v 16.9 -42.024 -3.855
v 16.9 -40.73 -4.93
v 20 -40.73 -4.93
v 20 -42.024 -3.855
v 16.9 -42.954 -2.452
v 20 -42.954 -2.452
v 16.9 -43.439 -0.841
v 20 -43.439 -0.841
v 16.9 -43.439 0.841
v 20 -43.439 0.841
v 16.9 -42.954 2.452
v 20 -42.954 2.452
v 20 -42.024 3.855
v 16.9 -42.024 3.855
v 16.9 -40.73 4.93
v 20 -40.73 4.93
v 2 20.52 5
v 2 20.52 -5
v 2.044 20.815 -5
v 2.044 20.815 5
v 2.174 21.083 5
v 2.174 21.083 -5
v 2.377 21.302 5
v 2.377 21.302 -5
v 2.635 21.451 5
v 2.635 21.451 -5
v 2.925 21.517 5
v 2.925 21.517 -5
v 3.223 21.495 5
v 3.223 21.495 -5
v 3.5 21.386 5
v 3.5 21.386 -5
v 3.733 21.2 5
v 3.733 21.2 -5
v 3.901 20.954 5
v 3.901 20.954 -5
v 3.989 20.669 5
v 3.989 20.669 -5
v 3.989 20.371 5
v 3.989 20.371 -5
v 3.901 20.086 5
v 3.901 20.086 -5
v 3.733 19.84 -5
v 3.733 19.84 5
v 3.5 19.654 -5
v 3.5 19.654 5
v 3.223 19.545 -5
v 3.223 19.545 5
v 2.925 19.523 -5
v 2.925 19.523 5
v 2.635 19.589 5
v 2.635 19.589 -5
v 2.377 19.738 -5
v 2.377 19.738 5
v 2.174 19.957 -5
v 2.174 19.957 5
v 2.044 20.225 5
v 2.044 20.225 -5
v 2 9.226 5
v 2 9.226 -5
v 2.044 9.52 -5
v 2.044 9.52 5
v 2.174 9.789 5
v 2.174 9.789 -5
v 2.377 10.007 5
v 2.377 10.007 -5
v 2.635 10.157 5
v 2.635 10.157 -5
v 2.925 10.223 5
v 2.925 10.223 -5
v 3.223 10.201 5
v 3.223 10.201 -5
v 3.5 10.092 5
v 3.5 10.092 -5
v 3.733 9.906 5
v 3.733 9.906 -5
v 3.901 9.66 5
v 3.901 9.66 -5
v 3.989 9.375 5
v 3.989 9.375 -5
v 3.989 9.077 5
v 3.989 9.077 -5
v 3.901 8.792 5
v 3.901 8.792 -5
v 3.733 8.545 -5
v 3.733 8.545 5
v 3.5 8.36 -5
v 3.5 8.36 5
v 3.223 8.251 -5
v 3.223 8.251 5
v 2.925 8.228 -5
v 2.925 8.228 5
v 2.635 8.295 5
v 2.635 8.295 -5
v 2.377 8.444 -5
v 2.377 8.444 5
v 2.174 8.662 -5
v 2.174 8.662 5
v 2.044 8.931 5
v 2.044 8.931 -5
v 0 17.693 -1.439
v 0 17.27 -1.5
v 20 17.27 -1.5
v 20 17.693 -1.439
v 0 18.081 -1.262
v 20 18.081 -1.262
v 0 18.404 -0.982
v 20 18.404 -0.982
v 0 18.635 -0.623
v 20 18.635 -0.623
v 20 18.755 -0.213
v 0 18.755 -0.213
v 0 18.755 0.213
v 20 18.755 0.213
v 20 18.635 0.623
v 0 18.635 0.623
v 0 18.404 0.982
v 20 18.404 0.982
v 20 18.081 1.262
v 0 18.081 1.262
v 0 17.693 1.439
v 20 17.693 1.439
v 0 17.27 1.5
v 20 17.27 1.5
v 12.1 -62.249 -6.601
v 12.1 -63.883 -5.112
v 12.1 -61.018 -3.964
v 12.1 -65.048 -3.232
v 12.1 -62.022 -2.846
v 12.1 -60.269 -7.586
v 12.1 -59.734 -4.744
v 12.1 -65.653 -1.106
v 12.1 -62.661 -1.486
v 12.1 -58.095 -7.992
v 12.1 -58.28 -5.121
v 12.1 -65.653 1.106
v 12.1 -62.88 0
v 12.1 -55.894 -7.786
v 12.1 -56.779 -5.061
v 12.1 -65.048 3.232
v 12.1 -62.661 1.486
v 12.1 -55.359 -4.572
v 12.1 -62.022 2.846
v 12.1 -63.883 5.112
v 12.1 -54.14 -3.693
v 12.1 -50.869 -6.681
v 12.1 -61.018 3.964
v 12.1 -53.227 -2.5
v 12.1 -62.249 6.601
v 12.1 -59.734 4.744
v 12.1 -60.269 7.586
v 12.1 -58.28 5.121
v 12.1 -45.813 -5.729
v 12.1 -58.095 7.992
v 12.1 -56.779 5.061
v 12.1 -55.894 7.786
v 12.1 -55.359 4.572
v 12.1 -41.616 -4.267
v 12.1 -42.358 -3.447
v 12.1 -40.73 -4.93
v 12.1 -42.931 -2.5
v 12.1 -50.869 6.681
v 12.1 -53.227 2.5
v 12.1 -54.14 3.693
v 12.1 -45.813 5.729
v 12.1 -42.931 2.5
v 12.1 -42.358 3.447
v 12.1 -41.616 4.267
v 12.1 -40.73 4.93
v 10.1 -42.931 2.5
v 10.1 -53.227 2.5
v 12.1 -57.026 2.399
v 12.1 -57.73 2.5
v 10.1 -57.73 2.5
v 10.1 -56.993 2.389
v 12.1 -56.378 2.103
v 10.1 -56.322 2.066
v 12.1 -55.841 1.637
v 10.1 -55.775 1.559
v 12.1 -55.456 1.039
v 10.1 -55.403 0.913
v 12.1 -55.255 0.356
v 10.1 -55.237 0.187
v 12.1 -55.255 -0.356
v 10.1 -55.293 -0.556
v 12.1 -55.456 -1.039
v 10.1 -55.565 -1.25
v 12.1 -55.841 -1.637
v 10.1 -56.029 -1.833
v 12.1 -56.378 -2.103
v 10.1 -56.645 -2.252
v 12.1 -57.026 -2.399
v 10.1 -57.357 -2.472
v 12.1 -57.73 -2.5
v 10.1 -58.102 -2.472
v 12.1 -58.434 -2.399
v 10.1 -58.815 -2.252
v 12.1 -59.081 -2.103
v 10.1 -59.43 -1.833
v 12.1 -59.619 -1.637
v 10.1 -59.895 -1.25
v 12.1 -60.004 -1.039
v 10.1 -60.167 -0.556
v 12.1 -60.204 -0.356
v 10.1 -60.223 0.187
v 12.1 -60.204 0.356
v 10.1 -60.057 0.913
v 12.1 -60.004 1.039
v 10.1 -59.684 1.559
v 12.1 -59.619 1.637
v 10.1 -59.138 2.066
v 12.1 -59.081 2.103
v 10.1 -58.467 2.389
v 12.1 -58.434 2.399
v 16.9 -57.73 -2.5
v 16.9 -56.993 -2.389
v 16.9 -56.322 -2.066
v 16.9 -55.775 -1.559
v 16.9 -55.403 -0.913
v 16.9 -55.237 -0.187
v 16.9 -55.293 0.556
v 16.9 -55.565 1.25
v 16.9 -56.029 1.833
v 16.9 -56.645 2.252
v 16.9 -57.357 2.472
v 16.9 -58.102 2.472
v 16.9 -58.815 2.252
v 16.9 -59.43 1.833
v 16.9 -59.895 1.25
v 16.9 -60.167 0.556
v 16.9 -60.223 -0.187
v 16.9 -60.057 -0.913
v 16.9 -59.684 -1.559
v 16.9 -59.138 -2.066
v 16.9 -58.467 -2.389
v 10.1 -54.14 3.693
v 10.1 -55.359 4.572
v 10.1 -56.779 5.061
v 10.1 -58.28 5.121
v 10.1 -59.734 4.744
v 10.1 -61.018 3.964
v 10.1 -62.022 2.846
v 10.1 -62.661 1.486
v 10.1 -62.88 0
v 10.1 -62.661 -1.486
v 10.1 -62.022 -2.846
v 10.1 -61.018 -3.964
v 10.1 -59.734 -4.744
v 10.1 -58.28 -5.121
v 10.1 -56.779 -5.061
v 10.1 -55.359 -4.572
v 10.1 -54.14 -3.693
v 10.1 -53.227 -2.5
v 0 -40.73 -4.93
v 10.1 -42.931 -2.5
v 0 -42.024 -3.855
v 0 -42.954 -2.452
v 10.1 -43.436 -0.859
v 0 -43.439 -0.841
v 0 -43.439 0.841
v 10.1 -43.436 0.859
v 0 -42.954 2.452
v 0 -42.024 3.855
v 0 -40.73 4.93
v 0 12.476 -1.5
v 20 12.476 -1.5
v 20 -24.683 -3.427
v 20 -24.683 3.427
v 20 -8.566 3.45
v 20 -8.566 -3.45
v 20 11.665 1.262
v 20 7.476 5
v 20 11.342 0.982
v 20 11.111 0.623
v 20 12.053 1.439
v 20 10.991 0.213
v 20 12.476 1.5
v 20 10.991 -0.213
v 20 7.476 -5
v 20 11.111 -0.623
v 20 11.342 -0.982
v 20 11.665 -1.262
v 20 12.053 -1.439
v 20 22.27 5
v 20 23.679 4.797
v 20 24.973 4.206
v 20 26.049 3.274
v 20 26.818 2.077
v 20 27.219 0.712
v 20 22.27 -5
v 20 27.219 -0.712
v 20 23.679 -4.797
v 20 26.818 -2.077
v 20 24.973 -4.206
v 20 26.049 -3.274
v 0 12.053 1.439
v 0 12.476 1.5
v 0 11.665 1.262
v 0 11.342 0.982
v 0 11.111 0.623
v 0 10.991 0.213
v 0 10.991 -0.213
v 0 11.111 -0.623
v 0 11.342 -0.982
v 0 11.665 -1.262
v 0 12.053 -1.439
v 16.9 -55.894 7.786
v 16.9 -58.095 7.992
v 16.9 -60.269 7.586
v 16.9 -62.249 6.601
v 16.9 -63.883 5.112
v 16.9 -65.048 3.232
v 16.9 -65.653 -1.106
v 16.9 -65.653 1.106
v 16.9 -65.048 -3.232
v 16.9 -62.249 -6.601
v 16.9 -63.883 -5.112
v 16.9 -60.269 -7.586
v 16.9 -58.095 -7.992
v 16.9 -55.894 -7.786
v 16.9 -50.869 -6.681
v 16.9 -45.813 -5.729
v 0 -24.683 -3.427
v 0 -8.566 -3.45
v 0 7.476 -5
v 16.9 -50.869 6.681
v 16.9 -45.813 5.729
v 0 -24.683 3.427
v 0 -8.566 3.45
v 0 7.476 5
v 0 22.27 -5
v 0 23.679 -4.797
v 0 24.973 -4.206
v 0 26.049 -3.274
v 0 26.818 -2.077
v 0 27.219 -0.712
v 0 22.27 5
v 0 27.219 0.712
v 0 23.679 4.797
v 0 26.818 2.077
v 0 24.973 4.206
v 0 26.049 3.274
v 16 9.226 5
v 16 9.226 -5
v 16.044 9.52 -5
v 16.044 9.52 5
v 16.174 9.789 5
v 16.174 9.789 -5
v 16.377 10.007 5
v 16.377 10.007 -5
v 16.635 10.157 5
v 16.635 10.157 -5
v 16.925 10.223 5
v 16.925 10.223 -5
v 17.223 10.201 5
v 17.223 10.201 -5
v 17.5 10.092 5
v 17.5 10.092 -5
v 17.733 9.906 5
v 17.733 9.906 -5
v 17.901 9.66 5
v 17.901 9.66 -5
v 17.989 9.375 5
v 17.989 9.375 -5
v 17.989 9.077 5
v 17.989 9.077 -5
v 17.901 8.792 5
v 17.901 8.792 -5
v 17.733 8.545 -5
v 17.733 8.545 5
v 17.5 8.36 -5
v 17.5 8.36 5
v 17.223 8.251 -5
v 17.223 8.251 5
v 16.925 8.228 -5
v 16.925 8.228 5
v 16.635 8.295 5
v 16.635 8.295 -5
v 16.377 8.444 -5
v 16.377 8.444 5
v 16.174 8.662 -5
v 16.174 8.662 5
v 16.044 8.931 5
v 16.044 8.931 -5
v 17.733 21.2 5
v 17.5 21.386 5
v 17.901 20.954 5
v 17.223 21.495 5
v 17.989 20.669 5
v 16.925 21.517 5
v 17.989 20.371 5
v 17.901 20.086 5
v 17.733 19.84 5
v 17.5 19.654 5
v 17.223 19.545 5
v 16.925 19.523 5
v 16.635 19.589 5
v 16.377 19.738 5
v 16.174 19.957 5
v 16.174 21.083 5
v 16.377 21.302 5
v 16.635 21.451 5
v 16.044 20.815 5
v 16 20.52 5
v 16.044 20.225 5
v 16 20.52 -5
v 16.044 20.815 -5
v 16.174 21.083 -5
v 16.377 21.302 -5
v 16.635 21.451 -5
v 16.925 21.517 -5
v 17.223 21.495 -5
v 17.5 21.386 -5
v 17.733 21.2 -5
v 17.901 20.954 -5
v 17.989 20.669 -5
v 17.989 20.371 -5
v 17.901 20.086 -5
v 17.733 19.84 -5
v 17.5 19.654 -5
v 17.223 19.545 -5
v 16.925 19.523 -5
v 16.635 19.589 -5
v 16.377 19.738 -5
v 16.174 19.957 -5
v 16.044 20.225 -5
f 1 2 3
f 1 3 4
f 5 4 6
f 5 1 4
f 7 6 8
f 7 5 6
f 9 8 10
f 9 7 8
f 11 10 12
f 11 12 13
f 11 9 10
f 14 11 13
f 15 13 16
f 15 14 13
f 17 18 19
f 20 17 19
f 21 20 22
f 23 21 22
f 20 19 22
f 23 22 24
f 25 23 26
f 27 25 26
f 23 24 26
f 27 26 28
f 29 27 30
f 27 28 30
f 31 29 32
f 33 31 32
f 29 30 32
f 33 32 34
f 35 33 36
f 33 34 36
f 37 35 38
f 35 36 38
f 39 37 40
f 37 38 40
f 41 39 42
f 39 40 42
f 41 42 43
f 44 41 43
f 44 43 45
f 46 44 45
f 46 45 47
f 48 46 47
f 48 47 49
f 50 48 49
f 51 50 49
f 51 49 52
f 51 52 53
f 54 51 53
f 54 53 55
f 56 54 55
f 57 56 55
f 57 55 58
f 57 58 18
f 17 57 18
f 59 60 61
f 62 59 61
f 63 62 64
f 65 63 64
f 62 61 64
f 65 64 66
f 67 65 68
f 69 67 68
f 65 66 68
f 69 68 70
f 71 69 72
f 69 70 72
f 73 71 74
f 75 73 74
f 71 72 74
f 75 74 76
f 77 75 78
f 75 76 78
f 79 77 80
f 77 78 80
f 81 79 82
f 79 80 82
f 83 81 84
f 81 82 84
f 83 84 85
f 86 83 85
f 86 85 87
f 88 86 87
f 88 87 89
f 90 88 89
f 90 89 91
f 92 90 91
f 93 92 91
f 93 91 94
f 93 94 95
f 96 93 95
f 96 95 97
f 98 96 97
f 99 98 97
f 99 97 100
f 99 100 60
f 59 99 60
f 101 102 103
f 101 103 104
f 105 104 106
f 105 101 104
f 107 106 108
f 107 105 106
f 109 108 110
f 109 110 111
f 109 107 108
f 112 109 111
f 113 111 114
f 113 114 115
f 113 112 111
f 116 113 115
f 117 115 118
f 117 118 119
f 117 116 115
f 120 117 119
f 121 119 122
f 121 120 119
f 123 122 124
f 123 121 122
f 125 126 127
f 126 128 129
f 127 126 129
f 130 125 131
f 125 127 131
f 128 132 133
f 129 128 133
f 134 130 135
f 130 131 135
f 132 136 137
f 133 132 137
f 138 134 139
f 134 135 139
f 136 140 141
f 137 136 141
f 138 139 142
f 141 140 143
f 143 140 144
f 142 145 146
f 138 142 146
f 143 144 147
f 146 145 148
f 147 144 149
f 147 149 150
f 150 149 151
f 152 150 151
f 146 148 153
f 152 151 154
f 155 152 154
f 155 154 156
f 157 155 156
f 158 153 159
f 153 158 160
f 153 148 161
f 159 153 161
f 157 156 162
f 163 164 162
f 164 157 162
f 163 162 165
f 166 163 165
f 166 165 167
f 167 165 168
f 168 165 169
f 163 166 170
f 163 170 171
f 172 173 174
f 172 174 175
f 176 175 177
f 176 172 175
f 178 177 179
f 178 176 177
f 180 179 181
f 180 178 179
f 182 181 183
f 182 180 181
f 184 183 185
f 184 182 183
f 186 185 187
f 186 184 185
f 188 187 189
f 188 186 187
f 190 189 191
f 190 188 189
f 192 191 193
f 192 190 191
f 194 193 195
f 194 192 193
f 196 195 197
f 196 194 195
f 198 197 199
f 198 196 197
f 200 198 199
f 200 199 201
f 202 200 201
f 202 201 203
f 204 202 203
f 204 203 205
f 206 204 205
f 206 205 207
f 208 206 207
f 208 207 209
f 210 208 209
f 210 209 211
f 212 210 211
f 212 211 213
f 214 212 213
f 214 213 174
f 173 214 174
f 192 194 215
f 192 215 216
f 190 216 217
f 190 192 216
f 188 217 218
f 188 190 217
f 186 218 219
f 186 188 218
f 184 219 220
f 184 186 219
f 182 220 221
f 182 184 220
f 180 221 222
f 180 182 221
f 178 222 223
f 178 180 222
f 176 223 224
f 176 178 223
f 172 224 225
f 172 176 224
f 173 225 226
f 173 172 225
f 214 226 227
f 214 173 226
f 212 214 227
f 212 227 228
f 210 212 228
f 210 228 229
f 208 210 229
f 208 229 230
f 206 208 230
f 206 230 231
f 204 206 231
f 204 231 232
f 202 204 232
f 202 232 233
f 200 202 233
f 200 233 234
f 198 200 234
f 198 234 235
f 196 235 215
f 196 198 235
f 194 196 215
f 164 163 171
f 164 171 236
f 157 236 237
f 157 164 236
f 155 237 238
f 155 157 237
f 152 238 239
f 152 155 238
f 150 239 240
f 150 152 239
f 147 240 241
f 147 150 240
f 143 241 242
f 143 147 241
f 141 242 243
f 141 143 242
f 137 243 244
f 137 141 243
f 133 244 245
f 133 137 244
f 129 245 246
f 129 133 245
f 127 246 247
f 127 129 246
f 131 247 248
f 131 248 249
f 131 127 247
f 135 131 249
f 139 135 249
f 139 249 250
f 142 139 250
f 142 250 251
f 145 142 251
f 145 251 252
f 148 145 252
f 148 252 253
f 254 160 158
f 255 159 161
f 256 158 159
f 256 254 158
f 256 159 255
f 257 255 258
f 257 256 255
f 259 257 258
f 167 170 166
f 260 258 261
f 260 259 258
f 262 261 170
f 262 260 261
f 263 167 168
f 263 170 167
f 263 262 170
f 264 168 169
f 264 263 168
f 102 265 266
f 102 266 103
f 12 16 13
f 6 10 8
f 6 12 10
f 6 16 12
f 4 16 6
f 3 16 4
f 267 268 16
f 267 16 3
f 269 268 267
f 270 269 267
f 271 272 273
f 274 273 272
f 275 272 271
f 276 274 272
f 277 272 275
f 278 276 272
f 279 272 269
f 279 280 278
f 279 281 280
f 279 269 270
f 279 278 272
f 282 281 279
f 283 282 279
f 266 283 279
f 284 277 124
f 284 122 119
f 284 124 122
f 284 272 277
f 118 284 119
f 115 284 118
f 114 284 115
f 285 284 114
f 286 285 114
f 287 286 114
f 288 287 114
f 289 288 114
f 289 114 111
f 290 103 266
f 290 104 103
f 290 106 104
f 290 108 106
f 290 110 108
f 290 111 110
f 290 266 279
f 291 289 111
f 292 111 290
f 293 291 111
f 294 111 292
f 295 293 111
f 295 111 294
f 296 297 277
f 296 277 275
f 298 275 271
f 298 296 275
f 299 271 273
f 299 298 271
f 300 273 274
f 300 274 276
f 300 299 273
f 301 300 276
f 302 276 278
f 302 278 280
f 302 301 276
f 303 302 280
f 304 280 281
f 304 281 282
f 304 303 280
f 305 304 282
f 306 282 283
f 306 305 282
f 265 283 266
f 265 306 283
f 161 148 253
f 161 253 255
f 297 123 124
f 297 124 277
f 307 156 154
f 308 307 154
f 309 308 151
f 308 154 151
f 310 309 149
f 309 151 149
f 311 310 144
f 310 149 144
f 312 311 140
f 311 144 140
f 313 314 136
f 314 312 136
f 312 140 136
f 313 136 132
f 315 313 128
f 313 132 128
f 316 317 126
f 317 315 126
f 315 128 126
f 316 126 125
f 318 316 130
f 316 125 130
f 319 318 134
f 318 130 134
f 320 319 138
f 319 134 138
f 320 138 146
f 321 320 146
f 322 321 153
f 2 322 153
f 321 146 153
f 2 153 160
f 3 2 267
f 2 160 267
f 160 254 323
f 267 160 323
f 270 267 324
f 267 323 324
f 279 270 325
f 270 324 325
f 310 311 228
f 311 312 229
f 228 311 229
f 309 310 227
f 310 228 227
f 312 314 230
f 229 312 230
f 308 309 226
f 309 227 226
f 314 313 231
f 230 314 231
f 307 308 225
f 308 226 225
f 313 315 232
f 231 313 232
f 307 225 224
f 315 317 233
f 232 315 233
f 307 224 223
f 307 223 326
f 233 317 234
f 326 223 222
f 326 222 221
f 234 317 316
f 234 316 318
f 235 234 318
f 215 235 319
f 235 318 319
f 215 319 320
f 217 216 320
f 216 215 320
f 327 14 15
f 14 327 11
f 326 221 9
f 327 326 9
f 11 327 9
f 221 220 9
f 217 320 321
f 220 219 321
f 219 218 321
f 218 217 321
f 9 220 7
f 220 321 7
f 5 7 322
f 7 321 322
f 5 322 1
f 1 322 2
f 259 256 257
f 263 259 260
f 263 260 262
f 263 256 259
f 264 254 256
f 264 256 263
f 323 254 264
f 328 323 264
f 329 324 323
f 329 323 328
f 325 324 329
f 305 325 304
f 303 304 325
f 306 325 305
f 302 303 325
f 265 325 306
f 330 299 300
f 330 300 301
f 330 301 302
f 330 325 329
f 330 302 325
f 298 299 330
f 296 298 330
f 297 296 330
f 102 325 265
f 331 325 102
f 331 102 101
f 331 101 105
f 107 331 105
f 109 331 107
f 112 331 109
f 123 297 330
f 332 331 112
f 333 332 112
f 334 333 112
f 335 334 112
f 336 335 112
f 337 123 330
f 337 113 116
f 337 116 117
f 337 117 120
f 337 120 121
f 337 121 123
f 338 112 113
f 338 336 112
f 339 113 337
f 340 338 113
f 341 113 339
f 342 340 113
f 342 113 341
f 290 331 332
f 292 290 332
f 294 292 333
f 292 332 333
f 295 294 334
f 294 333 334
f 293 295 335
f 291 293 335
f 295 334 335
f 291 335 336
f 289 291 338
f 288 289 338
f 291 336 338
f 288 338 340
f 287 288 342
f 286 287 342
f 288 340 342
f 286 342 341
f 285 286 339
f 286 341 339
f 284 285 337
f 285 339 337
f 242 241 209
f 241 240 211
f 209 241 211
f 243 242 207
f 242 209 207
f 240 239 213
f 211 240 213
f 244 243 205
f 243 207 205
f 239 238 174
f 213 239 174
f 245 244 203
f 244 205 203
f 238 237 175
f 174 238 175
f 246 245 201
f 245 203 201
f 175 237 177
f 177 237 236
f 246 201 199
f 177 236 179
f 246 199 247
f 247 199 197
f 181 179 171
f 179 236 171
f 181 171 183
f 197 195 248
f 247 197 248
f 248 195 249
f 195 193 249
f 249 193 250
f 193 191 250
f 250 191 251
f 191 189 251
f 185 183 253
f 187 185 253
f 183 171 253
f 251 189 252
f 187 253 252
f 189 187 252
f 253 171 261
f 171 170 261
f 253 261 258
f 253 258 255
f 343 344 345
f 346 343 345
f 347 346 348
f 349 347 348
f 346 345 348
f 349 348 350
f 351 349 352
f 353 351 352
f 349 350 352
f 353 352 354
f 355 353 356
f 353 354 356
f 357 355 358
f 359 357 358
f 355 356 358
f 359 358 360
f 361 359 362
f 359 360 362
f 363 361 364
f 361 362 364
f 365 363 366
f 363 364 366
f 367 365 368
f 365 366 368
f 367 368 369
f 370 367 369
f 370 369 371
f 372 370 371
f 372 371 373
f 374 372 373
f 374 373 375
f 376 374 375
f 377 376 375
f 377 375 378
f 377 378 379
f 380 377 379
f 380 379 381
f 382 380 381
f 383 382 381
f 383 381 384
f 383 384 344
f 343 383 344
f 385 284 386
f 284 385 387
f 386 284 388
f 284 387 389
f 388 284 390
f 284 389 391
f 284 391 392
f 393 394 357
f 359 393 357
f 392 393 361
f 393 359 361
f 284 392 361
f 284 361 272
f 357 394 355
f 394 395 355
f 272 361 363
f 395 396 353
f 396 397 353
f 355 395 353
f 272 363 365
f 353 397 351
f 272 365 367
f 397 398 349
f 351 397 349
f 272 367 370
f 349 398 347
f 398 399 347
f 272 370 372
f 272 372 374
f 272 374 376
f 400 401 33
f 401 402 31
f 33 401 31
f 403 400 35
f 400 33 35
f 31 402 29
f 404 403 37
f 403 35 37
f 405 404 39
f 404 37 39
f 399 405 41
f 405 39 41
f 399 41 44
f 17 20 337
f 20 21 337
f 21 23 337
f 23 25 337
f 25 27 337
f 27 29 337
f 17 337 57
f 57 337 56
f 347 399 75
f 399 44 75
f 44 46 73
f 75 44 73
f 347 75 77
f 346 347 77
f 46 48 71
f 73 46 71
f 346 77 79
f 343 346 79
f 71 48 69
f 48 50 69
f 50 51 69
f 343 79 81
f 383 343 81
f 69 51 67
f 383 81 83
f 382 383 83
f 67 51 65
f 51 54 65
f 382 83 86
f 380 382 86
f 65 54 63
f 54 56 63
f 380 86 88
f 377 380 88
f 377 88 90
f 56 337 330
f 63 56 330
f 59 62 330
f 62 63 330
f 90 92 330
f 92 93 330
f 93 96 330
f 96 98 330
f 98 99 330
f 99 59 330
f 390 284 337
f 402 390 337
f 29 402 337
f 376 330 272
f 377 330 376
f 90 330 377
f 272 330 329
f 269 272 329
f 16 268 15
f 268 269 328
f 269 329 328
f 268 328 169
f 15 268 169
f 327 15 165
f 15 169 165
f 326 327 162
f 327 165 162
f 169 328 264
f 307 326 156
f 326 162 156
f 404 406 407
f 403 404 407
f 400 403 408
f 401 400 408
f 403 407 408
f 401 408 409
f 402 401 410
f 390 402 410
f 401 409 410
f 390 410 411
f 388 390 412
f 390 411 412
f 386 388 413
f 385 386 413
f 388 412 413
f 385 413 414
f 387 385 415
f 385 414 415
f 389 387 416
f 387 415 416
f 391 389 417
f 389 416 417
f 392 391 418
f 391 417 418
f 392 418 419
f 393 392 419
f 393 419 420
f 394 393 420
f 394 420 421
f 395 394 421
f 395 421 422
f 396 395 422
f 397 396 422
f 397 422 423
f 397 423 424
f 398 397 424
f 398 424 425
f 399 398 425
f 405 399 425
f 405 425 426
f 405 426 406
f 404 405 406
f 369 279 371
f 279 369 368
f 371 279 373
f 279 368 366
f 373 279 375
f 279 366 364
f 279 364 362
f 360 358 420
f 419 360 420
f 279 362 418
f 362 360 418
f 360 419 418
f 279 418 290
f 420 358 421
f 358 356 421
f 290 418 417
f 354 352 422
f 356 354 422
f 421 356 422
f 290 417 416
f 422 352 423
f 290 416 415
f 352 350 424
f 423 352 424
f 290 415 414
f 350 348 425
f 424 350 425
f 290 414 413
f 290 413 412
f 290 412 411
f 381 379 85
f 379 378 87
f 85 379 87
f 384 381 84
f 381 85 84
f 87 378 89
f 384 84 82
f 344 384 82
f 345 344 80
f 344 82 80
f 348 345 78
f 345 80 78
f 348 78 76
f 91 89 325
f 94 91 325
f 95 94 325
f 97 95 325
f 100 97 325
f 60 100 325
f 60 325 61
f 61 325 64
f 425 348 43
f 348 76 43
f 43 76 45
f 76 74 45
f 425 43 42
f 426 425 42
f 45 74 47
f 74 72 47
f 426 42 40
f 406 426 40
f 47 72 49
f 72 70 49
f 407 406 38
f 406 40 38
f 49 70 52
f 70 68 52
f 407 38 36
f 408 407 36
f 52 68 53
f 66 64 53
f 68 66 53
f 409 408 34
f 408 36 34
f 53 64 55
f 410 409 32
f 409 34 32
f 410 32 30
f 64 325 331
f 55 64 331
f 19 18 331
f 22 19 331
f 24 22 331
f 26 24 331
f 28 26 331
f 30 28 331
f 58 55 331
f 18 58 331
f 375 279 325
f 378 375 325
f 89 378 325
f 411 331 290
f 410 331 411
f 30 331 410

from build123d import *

# Parameters (mm, degrees)
SKETCH1_R                = 2.5
BOSS_EXTRUDE1_DEPTH      = 20
SKETCH24_W               = 8.1
SKETCH24_H               = 25
SKETCH24_W_2             = 3.1
CUT_EXTRUDE14_DEPTH      = 9
CUT_EXTRUDE14_DEPTH_BACK = 9
SKETCH25_R               = 1
CUT_EXTRUDE15_DEPTH      = 4
CUT_EXTRUDE15_DEPTH_BACK = 14
SKETCH31_W               = 4
SKETCH31_H               = 25
CUT_EXTRUDE17_DEPTH      = 4
CUT_EXTRUDE17_DEPTH_BACK = 14
BOSS_EXTRUDE5_START      = -20
BOSS_EXTRUDE5_DEPTH      = 20
SKETCH32_R               = 2.5
BOSS_EXTRUDE6_DEPTH      = 2


with BuildPart() as part:
    # Sketch1 → Boss-Extrude1 (new body)
    with BuildSketch(Plane(origin=(0, 0, 0), x_dir=(0, 0, -1), z_dir=(1, 0, 0))):
        with BuildLine():
            Line((-5, 22.270117322), (-5, 7.475642404))
            ThreePointArc((-5, 7.475642404), (-3.411481861, -24.340079768), (-7.786398999, -55.893584601))
            ThreePointArc((-7.786398999, -55.893584601), (0, -65.729882678), (7.786398999, -55.893584601))
            ThreePointArc((7.786398999, -55.893584601), (3.411481861, -24.340079768), (5, 7.475642404))
            Line((5, 7.475642404), (5, 22.270117322))
            ThreePointArc((5, 22.270117322), (0, 27.270117322), (-5, 22.270117322))
        make_face()
        with Locations((0, -57.729882678)):
            Circle(SKETCH1_R, mode=Mode.SUBTRACT)
        with BuildLine():
            Line((1.5, 12.475642404), (1.5, 17.270117322))
            ThreePointArc((1.5, 17.270117322), (0, 18.770117322), (-1.5, 17.270117322))
            Line((-1.5, 17.270117322), (-1.5, 12.475642404))
            ThreePointArc((-1.5, 12.475642404), (0, 10.975642404), (1.5, 12.475642404))
        make_face(mode=Mode.SUBTRACT)
    extrude(amount=BOSS_EXTRUDE1_DEPTH)

    # Sketch24 → Cut-Extrude14 (cut, two sides)
    with BuildSketch(Plane.XY) as cut_extrude14_sk:
        with Locations((4.05, -53.229882678)):
            Rectangle(SKETCH24_W, SKETCH24_H)
        with Locations((18.45, -53.229882678)):
            Rectangle(SKETCH24_W_2, SKETCH24_H)
    extrude(amount=CUT_EXTRUDE14_DEPTH, mode=Mode.SUBTRACT)
    extrude(cut_extrude14_sk.sketch, amount=-CUT_EXTRUDE14_DEPTH_BACK, mode=Mode.SUBTRACT)

    # Sketch25 → Cut-Extrude15 (cut, two sides)
    with BuildSketch(Plane(origin=(0, 0, -5), x_dir=(-1, 0, 0), z_dir=(0, 0, -1))) as cut_extrude15_sk:
        with Locations((-17, 9.225642404)):
            Circle(SKETCH25_R)
        with Locations((-17, 20.520117322)):
            Circle(SKETCH25_R)
        with Locations((-3, 9.225642404)):
            Circle(SKETCH25_R)
        with Locations((-3, 20.520117322)):
            Circle(SKETCH25_R)
    extrude(amount=CUT_EXTRUDE15_DEPTH, mode=Mode.SUBTRACT)
    extrude(cut_extrude15_sk.sketch, amount=-CUT_EXTRUDE15_DEPTH_BACK, mode=Mode.SUBTRACT)

    # Sketch31 → Cut-Extrude17 (cut, two sides)
    with BuildSketch(Plane.XY.offset(5)) as cut_extrude17_sk:
        with Locations((10.1, -53.229882678)):
            Rectangle(SKETCH31_W, SKETCH31_H)
    extrude(amount=CUT_EXTRUDE17_DEPTH, mode=Mode.SUBTRACT)
    extrude(cut_extrude17_sk.sketch, amount=-CUT_EXTRUDE17_DEPTH_BACK, mode=Mode.SUBTRACT)

    # Sketch26 → Boss-Extrude5 (add)
    with BuildSketch(Plane(origin=(20, 0, 0), x_dir=(0, 0, -1), z_dir=(1, 0, 0)).offset(BOSS_EXTRUDE5_START)):
        with BuildLine():
            Line((-4.929780951, -40.729882678), (4.929780951, -40.729882678))
            ThreePointArc((4.929780951, -40.729882678), (0, -43.50073532), (-4.929780951, -40.729882678))
        make_face()
    extrude(amount=BOSS_EXTRUDE5_DEPTH)

    # Sketch32 → Boss-Extrude6 (add)
    with BuildSketch(Plane.ZY.offset(-12.1)):
        with BuildLine():
            Line((-2.5, -53.227383372), (-2.5, -42.931107555))
            Line((-2.5, -42.931107555), (2.5, -42.931107555))
            Line((2.5, -42.931107555), (2.5, -53.227383372))
            ThreePointArc((2.5, -53.227383372), (0, -62.879882678), (-2.5, -53.227383372))
        make_face()
        with Locations((0, -57.729882678)):
            Circle(SKETCH32_R, mode=Mode.SUBTRACT)
    extrude(amount=BOSS_EXTRUDE6_DEPTH)


solid = part.part
